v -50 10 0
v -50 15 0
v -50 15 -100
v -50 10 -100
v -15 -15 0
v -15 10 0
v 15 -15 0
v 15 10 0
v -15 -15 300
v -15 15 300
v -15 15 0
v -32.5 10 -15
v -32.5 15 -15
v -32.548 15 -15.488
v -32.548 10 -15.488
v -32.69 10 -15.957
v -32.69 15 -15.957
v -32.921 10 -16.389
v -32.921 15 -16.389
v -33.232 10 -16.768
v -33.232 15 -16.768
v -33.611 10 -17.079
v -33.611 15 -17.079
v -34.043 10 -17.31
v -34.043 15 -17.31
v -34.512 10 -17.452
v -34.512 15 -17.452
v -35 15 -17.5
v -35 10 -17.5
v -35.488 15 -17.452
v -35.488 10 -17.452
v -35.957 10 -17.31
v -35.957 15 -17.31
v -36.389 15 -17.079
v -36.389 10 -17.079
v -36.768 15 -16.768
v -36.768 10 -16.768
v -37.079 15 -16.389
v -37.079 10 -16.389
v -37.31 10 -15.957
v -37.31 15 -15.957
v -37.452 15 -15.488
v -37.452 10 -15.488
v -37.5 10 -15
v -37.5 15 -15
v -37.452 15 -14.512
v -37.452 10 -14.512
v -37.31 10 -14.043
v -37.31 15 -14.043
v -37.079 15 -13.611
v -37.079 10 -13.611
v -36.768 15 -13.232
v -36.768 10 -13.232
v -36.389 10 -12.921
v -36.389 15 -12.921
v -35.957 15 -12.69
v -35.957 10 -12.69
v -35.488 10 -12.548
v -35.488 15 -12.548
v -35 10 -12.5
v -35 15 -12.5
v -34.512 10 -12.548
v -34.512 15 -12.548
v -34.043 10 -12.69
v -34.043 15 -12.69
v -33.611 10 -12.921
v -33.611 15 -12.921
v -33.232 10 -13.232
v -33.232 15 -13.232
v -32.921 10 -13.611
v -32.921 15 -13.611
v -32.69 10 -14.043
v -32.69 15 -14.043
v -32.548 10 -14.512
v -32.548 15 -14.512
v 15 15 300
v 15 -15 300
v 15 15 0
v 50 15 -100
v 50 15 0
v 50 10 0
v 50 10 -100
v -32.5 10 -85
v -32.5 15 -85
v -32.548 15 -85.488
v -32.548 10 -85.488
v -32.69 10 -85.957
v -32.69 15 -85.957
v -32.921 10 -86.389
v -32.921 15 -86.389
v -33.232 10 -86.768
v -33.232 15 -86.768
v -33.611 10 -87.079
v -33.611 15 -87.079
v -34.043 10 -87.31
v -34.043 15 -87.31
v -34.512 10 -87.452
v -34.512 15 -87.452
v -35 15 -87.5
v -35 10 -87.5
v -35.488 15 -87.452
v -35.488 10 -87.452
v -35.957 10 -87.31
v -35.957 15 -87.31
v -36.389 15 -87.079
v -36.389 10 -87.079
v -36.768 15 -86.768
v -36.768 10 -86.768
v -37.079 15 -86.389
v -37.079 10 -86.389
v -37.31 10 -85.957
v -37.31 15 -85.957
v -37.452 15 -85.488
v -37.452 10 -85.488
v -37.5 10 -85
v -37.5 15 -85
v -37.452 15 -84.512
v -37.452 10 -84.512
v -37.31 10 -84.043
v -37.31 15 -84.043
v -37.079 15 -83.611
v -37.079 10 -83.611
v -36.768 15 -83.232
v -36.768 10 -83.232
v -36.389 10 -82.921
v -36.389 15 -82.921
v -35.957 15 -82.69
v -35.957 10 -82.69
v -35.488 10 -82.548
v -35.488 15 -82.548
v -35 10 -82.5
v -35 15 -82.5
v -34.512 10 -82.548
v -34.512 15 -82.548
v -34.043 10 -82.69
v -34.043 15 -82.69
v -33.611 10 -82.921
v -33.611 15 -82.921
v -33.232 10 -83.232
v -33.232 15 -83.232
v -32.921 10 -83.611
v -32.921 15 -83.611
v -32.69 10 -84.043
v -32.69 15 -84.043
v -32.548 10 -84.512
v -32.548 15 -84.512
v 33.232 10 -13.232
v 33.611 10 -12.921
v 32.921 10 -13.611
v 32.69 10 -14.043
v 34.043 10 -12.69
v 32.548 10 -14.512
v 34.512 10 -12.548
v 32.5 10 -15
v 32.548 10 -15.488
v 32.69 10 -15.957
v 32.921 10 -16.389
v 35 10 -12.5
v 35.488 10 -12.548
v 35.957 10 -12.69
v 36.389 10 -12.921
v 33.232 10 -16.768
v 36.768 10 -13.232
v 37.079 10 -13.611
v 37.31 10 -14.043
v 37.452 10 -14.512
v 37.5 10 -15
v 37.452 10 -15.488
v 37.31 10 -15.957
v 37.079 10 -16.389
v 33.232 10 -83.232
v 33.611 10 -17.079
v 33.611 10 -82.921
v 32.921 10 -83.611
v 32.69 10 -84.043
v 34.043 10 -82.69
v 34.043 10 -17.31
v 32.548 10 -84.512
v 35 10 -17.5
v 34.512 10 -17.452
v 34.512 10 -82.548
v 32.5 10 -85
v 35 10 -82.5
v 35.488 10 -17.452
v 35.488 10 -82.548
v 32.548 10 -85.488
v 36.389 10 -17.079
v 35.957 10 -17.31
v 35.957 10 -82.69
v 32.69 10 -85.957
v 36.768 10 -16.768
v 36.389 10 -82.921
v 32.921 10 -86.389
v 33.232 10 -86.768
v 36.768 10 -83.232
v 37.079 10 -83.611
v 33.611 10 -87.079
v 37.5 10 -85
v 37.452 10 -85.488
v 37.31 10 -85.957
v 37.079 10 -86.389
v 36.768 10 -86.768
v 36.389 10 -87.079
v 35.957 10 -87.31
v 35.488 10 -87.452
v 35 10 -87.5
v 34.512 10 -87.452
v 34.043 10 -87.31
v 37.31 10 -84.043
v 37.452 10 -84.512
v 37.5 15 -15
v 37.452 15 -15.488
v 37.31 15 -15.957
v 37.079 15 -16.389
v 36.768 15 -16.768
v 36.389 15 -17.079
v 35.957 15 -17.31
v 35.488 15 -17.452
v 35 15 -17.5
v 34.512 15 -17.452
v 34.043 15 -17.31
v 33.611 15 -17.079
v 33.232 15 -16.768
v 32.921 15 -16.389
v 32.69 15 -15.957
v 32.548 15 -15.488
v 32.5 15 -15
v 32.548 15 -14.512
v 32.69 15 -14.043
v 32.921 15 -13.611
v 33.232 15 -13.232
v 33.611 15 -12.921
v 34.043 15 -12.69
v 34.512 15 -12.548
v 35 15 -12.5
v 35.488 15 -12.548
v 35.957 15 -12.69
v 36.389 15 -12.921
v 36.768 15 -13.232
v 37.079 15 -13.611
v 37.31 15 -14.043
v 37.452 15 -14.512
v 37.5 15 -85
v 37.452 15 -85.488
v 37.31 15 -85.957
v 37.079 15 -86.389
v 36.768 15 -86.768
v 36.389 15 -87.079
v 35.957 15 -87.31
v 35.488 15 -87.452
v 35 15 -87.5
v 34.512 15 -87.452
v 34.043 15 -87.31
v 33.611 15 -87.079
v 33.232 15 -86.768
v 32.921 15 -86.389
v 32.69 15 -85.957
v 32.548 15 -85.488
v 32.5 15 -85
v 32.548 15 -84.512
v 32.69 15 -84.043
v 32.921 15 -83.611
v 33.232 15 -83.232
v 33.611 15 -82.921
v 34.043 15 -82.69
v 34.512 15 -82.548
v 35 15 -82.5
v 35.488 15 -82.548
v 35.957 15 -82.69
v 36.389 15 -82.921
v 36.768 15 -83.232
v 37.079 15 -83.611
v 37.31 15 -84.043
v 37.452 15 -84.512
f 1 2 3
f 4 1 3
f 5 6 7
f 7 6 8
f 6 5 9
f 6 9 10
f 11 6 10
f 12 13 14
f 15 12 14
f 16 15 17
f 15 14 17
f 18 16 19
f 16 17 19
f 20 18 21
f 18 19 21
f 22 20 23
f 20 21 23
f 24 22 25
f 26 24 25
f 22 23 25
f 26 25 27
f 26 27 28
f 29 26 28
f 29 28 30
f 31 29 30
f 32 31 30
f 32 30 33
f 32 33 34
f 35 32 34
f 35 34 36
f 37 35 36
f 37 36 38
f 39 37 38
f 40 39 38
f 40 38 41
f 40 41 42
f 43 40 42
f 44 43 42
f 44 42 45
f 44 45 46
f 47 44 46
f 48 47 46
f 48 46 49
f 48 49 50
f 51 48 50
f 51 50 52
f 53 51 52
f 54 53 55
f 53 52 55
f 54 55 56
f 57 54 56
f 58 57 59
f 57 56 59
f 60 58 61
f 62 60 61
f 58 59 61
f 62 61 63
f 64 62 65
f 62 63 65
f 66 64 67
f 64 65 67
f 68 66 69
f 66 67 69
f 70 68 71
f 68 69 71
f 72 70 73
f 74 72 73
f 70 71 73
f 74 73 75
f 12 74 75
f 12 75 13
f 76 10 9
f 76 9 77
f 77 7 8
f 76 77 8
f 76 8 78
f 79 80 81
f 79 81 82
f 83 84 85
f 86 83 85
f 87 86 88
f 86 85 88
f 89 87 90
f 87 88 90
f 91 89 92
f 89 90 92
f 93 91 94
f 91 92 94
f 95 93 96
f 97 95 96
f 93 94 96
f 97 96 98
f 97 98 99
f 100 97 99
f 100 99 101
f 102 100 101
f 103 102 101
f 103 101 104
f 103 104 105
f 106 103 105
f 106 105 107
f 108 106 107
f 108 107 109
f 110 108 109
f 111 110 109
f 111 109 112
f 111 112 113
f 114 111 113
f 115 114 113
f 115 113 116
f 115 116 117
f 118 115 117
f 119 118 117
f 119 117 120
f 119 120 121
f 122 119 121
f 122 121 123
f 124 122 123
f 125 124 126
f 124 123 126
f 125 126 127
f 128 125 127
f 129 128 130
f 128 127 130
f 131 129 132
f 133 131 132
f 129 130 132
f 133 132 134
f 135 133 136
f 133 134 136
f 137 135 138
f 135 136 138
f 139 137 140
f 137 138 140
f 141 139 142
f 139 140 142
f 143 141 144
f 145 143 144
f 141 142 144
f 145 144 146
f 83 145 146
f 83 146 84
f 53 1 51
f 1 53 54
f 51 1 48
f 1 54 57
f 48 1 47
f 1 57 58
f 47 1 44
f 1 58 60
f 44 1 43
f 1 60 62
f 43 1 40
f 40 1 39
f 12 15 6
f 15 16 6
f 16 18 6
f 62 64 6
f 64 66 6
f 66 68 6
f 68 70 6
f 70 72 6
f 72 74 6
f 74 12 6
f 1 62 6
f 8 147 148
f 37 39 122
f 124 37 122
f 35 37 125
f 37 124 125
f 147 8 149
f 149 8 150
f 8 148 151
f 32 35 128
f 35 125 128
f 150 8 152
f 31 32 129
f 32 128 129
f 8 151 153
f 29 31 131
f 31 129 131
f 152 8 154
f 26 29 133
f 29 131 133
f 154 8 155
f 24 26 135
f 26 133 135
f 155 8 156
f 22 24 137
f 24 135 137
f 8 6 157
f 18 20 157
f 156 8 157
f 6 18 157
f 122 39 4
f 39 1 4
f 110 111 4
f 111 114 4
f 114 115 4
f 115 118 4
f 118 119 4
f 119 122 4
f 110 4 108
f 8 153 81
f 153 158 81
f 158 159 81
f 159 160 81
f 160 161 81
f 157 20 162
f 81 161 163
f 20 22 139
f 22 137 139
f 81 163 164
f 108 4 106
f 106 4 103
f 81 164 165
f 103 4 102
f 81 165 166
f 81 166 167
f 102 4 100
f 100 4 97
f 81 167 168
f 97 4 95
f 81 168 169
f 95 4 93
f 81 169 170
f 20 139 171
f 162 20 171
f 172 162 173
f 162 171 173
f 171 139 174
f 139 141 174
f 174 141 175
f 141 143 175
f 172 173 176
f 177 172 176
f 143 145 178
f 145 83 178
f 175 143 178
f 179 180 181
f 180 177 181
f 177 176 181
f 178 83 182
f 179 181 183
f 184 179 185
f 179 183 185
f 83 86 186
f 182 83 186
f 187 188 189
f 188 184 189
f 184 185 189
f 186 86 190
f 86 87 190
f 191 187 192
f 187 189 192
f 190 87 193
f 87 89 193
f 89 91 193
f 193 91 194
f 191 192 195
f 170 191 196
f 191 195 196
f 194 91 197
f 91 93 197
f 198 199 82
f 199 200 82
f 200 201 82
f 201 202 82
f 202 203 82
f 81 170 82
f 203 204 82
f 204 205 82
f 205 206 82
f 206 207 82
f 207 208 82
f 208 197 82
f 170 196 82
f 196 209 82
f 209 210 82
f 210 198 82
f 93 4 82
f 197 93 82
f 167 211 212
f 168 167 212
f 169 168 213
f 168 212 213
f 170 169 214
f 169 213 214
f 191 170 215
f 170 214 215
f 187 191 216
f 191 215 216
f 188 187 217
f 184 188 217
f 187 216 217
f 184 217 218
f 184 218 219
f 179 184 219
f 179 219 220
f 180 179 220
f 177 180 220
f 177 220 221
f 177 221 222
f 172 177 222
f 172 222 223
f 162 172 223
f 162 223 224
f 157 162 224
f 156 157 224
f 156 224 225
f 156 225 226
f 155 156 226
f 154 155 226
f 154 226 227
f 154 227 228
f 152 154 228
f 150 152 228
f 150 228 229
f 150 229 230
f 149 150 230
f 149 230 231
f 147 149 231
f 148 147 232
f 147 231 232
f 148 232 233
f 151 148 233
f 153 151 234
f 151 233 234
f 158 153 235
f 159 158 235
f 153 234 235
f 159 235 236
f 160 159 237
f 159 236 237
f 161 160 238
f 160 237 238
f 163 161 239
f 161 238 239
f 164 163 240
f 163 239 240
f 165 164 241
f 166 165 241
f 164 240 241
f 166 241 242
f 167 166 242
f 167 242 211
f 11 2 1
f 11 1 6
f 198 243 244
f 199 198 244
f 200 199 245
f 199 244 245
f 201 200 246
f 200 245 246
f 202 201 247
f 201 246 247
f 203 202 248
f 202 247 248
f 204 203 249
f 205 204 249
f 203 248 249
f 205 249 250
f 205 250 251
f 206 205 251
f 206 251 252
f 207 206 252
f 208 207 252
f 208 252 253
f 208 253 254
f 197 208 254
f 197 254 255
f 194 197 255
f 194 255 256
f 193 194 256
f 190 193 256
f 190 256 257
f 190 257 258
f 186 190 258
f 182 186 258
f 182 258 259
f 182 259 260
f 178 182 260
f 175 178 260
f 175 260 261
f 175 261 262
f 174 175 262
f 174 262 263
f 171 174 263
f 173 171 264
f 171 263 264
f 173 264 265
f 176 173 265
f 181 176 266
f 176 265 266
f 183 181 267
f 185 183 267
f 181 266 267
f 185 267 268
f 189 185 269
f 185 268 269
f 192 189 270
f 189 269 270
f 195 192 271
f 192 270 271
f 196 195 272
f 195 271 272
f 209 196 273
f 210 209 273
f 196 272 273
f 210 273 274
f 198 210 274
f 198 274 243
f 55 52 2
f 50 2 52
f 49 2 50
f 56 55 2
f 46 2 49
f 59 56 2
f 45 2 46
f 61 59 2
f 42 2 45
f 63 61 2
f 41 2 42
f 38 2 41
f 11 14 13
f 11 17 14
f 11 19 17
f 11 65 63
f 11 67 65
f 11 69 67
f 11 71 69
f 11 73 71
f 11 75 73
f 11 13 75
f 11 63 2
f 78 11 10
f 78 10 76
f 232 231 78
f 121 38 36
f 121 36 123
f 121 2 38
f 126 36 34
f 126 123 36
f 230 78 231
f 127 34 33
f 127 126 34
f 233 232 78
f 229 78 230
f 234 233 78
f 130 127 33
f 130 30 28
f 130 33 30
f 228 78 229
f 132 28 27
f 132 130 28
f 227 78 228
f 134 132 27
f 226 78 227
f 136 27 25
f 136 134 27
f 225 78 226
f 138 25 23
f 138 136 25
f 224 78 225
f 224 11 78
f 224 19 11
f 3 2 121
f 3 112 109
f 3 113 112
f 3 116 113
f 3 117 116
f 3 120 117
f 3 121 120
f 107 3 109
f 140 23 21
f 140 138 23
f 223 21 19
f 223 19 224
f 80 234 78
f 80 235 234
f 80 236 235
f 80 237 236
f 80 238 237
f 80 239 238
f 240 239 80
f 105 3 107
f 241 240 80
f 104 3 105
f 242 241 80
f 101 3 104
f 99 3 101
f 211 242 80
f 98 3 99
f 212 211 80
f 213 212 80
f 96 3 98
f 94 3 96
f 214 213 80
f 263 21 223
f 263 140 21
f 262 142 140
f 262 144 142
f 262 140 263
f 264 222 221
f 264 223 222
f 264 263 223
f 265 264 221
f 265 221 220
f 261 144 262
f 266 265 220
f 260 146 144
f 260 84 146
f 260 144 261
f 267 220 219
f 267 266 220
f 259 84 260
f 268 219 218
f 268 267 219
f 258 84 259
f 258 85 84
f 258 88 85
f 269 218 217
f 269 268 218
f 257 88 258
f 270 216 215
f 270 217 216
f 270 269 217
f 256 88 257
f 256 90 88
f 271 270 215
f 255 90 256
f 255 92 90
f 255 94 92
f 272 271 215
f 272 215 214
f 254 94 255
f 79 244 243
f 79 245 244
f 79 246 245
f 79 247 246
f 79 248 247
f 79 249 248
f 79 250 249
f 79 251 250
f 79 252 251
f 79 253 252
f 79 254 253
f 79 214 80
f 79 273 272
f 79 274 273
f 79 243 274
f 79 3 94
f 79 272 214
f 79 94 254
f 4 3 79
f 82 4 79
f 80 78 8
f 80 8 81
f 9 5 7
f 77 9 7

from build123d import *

# Parameters (mm, degrees)
SKETCH1_W           = 30
SKETCH1_H           = 30
BOSS_EXTRUDE1_DEPTH = 300
SKETCH2_W           = 100
SKETCH2_H           = 100
BOSS_EXTRUDE2_DEPTH = 5
CUT_EXTRUDE1_REACH  = 32
SKETCH3_R           = 2.5


with BuildPart() as part:
    # Sketch1 → Boss-Extrude1 (new body)
    with BuildSketch(Plane.XY):
        Rectangle(SKETCH1_W, SKETCH1_H)
    extrude(amount=BOSS_EXTRUDE1_DEPTH)

    # Sketch2 → Boss-Extrude2 (add)
    with BuildSketch(Plane(origin=(0, 15, 0), x_dir=(1, 0, 0), z_dir=(0, 1, 0))):
        with Locations((0, 50)):
            Rectangle(SKETCH2_W, SKETCH2_H)
    extrude(amount=-BOSS_EXTRUDE2_DEPTH)

    # Sketch3 → Cut-Extrude1 (cut, up to next)
    with BuildSketch(Plane(origin=(0, 15, 0), x_dir=(1, 0, 0), z_dir=(0, 1, 0)), mode=Mode.PRIVATE) as cut_extrude1_sk1:
        with Locations((-35, 15)):
            Circle(SKETCH3_R)
    cut_extrude1_tool1 = extrude(cut_extrude1_sk1.sketch, amount=-CUT_EXTRUDE1_REACH, mode=Mode.PRIVATE) & part.part
    add(cut_extrude1_tool1.solids().sort_by_distance((-35, 15, -15))[0], mode=Mode.SUBTRACT)
    # Sketch3 → Cut-Extrude1 (cut, up to next)
    with BuildSketch(Plane(origin=(0, 15, 0), x_dir=(1, 0, 0), z_dir=(0, 1, 0)), mode=Mode.PRIVATE) as cut_extrude1_sk2:
        with Locations((35, 15)):
            Circle(SKETCH3_R)
    cut_extrude1_tool2 = extrude(cut_extrude1_sk2.sketch, amount=-CUT_EXTRUDE1_REACH, mode=Mode.PRIVATE) & part.part
    add(cut_extrude1_tool2.solids().sort_by_distance((35, 15, -15))[0], mode=Mode.SUBTRACT)
    # Sketch3 → Cut-Extrude1 (cut, up to next)
    with BuildSketch(Plane(origin=(0, 15, 0), x_dir=(1, 0, 0), z_dir=(0, 1, 0)), mode=Mode.PRIVATE) as cut_extrude1_sk3:
        with Locations((-35, 85)):
            Circle(SKETCH3_R)
    cut_extrude1_tool3 = extrude(cut_extrude1_sk3.sketch, amount=-CUT_EXTRUDE1_REACH, mode=Mode.PRIVATE) & part.part
    add(cut_extrude1_tool3.solids().sort_by_distance((-35, 15, -85))[0], mode=Mode.SUBTRACT)
    # Sketch3 → Cut-Extrude1 (cut, up to next)
    with BuildSketch(Plane(origin=(0, 15, 0), x_dir=(1, 0, 0), z_dir=(0, 1, 0)), mode=Mode.PRIVATE) as cut_extrude1_sk4:
        with Locations((35, 85)):
            Circle(SKETCH3_R)
    cut_extrude1_tool4 = extrude(cut_extrude1_sk4.sketch, amount=-CUT_EXTRUDE1_REACH, mode=Mode.PRIVATE) & part.part
    add(cut_extrude1_tool4.solids().sort_by_distance((35, 15, -85))[0], mode=Mode.SUBTRACT)


solid = part.part
